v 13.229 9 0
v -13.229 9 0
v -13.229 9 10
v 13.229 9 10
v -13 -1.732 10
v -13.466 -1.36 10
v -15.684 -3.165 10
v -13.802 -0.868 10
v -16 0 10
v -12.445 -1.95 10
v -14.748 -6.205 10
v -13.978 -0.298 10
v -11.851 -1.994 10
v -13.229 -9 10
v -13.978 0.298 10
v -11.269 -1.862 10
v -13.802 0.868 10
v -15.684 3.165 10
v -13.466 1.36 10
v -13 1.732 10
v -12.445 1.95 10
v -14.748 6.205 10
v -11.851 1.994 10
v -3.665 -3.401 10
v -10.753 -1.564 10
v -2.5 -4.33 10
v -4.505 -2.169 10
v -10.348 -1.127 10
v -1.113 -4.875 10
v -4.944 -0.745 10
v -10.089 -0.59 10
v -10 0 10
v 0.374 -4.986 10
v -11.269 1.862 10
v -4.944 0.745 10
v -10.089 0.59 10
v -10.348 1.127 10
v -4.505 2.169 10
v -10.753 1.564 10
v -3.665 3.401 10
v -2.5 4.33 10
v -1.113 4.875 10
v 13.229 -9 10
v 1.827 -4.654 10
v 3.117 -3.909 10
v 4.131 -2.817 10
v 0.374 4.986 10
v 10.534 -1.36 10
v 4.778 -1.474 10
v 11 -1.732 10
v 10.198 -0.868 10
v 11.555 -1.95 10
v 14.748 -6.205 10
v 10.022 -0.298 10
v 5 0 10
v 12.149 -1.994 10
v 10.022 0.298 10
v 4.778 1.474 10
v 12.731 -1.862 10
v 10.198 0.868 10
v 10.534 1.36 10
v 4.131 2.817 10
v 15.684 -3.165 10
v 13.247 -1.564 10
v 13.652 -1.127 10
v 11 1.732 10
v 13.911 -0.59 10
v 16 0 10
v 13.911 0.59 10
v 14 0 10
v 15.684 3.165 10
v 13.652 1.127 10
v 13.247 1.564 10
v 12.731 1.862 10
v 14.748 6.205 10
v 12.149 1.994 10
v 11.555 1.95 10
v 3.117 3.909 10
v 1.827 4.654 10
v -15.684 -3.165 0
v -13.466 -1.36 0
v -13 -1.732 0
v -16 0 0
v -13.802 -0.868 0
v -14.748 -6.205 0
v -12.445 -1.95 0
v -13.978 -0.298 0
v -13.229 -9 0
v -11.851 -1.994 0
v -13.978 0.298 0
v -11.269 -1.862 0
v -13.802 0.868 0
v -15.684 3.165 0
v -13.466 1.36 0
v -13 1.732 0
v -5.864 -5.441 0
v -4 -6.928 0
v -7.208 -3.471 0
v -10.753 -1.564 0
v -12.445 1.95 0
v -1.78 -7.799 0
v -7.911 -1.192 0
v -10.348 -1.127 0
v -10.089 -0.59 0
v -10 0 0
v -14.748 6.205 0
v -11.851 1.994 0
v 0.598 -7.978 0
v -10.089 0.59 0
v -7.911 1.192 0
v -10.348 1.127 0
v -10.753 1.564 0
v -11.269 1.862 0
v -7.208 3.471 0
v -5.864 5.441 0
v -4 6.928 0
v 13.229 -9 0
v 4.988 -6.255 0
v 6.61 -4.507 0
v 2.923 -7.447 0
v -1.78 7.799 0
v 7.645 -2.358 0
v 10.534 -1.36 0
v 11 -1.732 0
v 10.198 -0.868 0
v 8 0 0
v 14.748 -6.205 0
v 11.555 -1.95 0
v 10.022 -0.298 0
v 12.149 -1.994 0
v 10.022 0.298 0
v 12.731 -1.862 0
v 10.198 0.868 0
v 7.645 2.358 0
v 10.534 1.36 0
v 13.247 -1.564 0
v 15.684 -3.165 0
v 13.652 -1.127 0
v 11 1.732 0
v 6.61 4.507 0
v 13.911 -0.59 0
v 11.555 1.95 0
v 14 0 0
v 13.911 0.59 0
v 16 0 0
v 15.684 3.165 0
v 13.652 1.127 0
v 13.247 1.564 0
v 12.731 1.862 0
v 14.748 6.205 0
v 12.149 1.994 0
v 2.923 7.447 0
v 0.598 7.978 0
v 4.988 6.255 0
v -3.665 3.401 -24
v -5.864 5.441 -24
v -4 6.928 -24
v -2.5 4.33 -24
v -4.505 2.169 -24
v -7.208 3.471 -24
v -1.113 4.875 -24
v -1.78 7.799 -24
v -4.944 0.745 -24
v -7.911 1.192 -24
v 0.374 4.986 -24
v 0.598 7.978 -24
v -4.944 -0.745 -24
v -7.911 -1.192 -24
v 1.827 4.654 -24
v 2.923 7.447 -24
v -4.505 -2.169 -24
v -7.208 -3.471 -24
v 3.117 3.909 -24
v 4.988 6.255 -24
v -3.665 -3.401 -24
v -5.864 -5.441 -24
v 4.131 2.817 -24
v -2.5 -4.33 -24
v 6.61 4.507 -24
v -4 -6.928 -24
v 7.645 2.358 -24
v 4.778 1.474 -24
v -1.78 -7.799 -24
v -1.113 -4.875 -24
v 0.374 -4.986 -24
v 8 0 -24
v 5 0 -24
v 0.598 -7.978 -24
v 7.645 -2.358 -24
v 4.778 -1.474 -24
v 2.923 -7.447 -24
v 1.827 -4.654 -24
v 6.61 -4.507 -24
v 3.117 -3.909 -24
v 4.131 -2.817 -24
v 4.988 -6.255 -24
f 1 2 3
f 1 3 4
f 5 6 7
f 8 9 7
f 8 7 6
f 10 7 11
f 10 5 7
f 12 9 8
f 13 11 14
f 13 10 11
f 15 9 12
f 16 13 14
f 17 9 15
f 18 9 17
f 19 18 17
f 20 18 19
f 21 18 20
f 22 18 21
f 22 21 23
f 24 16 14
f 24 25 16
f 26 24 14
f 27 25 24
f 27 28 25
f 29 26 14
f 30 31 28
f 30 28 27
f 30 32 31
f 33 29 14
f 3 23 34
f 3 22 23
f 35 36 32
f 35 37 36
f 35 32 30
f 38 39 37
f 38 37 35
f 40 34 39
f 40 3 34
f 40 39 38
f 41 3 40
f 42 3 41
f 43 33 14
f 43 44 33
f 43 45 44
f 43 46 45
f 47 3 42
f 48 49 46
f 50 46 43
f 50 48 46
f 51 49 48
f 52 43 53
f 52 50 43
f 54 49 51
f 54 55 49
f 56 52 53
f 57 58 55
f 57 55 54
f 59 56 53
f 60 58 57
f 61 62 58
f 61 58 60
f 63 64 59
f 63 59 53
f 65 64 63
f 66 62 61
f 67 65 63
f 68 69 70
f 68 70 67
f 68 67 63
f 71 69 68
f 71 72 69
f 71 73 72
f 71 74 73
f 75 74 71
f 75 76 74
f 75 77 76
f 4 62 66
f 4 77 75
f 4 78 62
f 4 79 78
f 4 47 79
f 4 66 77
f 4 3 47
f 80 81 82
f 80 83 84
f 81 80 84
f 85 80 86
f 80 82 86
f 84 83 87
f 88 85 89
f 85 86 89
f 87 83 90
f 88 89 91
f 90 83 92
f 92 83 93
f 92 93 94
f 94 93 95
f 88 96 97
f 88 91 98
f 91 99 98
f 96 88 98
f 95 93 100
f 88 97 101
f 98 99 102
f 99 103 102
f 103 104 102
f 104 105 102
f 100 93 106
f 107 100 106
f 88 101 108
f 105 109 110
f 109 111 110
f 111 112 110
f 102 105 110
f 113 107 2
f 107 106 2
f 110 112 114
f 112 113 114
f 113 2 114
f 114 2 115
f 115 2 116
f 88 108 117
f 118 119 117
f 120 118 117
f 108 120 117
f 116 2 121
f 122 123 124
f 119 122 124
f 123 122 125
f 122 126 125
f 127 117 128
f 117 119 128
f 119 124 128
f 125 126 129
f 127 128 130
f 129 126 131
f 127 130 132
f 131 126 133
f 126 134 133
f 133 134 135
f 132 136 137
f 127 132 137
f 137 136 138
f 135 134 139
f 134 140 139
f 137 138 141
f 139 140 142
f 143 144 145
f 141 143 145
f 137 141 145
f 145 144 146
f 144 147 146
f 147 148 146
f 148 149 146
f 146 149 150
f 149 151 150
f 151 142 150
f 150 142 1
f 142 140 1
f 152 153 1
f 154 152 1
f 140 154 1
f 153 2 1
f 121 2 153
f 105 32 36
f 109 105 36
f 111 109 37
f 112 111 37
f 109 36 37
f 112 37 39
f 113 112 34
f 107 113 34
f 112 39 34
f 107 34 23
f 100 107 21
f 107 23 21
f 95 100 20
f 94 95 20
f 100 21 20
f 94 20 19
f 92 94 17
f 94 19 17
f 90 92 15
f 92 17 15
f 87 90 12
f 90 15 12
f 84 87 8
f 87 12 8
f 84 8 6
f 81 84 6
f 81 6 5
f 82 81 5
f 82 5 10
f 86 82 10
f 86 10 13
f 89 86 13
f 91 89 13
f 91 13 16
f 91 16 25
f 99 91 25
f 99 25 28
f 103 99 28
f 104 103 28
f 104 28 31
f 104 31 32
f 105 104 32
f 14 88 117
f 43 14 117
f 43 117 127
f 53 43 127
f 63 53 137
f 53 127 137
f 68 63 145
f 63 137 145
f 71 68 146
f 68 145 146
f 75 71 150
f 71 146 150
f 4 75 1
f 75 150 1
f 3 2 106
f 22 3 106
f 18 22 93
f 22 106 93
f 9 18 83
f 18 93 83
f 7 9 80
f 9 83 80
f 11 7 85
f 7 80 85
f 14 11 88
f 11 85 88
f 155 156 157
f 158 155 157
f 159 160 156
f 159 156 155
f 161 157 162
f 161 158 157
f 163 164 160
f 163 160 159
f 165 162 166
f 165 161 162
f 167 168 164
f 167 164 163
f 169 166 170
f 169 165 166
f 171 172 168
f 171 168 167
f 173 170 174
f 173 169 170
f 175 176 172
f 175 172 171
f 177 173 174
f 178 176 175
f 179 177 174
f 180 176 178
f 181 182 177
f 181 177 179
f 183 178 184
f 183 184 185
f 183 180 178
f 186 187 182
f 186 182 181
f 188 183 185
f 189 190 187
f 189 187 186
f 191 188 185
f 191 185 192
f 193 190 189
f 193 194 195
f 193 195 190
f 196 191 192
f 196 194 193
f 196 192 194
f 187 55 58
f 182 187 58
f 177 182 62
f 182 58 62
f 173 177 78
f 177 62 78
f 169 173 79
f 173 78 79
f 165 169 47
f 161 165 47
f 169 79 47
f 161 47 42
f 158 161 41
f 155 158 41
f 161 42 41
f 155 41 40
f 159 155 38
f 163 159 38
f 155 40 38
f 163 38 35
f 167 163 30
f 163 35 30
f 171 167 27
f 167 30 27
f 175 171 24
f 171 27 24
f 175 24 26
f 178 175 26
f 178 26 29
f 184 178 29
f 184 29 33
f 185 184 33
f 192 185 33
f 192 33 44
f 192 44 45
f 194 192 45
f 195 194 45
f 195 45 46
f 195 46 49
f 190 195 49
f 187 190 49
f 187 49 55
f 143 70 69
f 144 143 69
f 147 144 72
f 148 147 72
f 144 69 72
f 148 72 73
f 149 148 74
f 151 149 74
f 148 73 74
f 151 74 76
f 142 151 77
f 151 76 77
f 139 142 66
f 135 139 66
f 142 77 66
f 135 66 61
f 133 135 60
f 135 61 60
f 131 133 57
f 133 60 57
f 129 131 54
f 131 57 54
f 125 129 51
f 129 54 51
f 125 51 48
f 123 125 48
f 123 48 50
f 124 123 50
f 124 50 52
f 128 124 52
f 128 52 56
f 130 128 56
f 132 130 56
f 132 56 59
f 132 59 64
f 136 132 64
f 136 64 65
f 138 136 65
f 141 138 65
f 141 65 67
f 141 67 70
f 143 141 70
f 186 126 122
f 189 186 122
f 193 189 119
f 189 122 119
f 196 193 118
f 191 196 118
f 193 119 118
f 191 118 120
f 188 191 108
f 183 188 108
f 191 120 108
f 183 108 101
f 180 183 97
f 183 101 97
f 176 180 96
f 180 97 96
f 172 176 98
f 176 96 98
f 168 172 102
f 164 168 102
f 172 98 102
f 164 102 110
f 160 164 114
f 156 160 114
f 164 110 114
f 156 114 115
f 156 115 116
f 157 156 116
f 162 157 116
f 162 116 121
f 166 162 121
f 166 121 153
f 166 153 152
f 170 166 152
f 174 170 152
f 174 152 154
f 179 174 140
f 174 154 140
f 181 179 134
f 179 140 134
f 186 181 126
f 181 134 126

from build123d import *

# Parameters (mm, degrees)
PAD_DEPTH     = 10
SKETCH001_R   = 8
PAD001_DEPTH  = 24
SKETCH002_R   = 5
SKETCH002_R_2 = 2
POCKET_DEPTH  = 34.001


with BuildPart() as part:
    # Sketch → Pad (new body)
    with BuildSketch(Plane.XY):
        with BuildLine():
            ThreePointArc((-13.228757, 9), (-16, 0), (-13.228757, -9))
            Line((-13.228757, -9), (13.228757, -9))
            ThreePointArc((13.228757, -9), (16, 0), (13.228757, 9))
            Line((-13.228757, 9), (13.228757, 9))
        make_face()
    extrude(amount=PAD_DEPTH)

    # Sketch001 (on Face5 of Pad) → Pad001 (join)
    with BuildSketch(Plane(origin=(0, 0, 0), x_dir=(1, 0, 0), z_dir=(0, 0, -1))):
        Circle(SKETCH001_R)
    extrude(amount=PAD001_DEPTH)

    # Sketch002 (on Face5 of Pad001) → Pocket (cut, through all)
    with BuildSketch(Plane.XY.offset(10)):
        Circle(SKETCH002_R)
        with Locations((12, 0)):
            Circle(SKETCH002_R_2)
        with Locations((-12, 0)):
            Circle(SKETCH002_R_2)
    extrude(amount=-POCKET_DEPTH, mode=Mode.SUBTRACT)


solid = part.part
